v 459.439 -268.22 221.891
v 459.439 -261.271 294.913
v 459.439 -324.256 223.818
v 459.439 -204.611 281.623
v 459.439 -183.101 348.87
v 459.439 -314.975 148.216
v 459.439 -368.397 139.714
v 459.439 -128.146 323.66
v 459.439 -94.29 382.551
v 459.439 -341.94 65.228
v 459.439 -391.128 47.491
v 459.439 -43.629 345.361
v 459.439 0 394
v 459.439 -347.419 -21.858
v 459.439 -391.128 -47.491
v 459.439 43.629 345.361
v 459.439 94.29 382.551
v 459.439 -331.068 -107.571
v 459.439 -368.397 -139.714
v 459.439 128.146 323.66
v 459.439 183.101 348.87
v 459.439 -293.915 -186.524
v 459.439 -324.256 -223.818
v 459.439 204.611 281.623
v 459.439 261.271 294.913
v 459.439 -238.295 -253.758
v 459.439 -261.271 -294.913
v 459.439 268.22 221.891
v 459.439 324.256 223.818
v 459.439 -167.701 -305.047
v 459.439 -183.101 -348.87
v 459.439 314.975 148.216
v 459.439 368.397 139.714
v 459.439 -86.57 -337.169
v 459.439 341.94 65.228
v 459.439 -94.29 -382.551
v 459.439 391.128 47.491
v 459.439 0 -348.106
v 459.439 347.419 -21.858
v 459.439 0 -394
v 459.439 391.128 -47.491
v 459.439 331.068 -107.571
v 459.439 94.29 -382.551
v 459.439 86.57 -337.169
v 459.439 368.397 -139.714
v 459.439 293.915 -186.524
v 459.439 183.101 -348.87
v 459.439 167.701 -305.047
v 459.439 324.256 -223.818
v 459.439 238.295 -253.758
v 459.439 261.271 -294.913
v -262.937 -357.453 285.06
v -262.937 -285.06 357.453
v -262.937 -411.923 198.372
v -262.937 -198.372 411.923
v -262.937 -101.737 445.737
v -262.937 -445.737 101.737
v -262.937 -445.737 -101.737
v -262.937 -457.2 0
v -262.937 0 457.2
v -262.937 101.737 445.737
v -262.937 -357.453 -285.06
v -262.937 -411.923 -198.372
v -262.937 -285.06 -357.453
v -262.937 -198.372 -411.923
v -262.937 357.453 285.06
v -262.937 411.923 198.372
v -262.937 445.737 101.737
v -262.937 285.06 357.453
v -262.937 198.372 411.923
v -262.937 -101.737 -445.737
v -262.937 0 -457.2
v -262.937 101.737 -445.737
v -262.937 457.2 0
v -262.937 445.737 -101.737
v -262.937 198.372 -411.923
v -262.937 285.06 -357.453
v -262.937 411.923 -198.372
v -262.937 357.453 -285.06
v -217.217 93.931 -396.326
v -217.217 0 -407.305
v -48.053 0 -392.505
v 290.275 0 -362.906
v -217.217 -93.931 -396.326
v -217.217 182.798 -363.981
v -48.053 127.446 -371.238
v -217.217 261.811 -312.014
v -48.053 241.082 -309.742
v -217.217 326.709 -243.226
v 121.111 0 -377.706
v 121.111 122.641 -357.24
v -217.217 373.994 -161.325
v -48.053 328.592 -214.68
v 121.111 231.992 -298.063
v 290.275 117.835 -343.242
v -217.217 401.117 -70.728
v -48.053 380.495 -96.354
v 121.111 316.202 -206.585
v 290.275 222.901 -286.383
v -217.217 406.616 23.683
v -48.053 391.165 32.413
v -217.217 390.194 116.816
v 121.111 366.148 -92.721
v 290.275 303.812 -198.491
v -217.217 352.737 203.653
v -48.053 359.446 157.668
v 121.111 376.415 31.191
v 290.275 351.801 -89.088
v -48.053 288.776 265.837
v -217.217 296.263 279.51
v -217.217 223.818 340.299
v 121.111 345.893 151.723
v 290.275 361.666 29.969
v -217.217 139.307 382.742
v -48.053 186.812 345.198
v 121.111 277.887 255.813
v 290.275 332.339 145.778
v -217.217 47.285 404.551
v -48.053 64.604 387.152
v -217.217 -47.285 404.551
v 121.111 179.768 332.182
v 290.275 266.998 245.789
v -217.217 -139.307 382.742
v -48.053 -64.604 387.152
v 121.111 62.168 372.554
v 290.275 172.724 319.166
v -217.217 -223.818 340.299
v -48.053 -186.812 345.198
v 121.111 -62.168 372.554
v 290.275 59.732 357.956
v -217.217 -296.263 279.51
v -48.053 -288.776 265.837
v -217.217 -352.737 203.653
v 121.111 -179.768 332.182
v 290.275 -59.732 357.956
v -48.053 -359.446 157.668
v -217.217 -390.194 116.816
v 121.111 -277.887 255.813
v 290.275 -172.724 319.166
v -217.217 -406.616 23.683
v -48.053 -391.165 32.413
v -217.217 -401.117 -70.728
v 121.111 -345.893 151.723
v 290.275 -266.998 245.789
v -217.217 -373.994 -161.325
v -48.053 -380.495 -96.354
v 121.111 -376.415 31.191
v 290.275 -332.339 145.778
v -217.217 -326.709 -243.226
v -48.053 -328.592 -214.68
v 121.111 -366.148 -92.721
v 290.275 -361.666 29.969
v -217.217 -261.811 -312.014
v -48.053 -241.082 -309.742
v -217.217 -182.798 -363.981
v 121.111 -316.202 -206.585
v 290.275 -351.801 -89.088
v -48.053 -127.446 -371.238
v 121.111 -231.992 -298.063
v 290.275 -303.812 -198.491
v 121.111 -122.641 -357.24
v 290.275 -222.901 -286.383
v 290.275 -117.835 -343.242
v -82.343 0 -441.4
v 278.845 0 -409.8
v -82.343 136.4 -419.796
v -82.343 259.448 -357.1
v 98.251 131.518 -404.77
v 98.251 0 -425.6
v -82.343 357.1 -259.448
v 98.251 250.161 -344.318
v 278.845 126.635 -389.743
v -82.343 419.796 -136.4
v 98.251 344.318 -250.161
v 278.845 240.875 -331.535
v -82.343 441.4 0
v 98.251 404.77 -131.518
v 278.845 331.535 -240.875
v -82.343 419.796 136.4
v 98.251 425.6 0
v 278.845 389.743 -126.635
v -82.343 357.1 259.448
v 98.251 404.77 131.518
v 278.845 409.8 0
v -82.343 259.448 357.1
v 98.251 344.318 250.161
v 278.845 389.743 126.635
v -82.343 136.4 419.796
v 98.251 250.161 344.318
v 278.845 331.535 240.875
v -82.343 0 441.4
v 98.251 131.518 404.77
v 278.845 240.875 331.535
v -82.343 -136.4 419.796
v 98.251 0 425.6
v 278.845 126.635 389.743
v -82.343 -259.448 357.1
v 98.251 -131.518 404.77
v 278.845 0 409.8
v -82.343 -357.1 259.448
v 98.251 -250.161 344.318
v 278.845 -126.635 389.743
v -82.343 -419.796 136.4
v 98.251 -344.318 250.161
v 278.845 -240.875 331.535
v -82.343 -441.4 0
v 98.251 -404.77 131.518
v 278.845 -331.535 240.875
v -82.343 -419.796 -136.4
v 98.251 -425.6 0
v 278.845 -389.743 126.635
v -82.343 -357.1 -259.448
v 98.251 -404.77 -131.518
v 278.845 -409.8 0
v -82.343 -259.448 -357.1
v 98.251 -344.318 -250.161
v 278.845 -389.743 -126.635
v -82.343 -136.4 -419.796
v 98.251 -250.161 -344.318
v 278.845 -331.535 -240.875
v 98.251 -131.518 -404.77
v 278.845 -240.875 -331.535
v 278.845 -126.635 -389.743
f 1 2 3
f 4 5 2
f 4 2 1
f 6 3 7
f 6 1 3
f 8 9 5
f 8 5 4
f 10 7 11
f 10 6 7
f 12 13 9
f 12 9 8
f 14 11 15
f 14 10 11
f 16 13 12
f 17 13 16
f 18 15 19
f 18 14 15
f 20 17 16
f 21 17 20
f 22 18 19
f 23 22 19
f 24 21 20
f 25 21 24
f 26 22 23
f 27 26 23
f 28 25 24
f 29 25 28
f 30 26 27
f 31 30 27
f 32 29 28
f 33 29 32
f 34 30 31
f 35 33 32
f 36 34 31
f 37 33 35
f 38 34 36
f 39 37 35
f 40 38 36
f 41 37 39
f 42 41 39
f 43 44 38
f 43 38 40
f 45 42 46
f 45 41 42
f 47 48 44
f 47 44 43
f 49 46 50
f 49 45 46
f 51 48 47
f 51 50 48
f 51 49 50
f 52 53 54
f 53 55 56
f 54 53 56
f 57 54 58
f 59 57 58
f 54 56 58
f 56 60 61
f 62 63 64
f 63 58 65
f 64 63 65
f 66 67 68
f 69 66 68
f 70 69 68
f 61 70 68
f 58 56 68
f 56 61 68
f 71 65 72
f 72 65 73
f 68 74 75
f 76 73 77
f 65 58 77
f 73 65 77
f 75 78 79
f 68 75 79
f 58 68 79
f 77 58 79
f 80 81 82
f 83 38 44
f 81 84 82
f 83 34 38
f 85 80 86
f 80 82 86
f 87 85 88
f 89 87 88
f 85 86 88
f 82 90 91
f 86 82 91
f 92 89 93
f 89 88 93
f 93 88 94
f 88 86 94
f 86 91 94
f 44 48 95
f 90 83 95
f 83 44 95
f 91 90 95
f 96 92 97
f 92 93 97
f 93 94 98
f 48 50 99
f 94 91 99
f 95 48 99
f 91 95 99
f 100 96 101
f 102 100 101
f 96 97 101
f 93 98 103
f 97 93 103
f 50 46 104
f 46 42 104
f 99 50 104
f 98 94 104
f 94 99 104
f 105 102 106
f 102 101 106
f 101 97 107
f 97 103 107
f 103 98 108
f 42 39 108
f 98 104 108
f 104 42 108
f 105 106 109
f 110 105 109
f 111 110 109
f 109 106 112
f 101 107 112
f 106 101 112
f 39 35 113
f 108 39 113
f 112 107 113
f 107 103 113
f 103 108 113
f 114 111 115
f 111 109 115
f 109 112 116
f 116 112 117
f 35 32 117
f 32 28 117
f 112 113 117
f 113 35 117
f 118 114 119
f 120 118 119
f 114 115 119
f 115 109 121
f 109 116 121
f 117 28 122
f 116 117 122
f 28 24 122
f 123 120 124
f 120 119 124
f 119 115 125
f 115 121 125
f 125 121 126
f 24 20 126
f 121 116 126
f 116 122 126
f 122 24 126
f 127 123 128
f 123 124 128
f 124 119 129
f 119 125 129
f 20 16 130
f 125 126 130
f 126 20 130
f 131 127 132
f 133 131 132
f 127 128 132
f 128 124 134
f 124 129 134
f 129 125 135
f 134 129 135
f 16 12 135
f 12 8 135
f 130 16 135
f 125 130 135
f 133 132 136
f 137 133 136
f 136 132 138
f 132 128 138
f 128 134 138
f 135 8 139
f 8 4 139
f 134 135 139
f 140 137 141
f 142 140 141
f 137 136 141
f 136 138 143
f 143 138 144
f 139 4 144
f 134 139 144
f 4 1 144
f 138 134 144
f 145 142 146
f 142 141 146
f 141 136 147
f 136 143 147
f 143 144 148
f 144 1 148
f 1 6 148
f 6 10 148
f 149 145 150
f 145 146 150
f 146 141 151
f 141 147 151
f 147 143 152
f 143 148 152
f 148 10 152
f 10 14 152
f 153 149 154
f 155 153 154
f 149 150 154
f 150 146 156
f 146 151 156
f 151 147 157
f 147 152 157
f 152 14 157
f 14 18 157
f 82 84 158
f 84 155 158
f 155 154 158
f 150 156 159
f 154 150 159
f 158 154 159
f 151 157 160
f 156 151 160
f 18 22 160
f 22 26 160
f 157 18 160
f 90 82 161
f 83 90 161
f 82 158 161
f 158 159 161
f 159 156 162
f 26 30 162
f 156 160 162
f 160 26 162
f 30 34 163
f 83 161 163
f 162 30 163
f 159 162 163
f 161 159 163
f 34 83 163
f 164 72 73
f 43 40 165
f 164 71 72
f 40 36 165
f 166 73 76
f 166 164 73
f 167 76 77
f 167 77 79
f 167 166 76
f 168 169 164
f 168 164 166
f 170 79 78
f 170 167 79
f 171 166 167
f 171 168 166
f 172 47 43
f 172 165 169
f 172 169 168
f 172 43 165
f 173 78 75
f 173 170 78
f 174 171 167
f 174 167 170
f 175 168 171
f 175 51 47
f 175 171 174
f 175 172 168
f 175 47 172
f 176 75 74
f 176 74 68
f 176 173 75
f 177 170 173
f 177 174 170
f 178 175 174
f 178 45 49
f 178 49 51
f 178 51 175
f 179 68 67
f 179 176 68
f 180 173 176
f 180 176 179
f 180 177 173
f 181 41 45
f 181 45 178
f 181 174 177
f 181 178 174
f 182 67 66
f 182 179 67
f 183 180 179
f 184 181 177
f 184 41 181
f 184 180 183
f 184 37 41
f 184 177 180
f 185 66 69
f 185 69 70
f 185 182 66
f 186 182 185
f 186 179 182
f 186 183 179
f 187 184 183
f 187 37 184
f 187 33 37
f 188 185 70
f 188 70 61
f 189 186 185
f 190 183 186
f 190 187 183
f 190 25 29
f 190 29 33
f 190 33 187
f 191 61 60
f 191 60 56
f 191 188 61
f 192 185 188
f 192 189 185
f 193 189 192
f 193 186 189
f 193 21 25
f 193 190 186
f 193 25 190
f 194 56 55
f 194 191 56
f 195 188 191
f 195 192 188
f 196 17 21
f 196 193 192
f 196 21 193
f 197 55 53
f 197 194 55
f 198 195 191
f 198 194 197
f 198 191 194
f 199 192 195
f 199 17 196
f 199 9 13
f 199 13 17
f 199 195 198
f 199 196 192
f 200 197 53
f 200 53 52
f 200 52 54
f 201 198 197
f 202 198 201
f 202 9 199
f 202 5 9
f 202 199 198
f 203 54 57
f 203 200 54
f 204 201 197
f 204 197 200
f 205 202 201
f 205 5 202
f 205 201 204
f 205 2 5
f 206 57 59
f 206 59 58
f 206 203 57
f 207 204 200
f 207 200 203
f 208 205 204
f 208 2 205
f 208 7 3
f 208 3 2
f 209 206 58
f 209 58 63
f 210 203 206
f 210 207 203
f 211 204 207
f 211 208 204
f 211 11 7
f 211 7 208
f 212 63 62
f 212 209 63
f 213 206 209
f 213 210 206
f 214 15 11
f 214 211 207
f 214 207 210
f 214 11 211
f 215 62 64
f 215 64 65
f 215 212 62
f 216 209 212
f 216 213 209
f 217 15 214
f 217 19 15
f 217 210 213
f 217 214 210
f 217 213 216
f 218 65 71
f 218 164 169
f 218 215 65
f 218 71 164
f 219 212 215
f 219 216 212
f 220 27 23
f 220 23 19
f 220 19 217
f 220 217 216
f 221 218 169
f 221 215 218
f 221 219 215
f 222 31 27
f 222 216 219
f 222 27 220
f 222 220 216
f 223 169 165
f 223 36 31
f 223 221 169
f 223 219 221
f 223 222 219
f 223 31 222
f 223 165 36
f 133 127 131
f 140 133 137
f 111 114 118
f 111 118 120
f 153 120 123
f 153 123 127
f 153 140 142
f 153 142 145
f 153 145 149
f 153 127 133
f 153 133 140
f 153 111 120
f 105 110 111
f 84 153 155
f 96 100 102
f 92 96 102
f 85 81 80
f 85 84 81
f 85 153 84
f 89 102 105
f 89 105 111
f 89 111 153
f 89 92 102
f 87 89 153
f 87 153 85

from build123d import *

# Parameters (mm, degrees)
SKETCH1_R           = 25.4
BOSS_EXTRUDE1_DEPTH = 40.132
BOSS_EXTRUDE1_TAPER = 5
SHELL1_T            = -2.54
SCALE1_SCALE        = 18


with BuildPart() as part:
    # Sketch1 → Boss-Extrude1 (new body)
    with BuildSketch(Plane(origin=(0, 0, 0), x_dir=(0, 0, -1), z_dir=(1, 0, 0))):
        Circle(SKETCH1_R)
    extrude(amount=BOSS_EXTRUDE1_DEPTH, taper=BOSS_EXTRUDE1_TAPER)

    # Shell1
    shell1_openings = [part.faces().sort_by_distance(p)[0] for p in [
        (40.132, 0, 0),
    ]]
    offset(amount=SHELL1_T, openings=shell1_openings, kind=Kind.INTERSECTION)


with BuildPart() as part_1:
    # Scale1: scaled about (15.466911265, 0, 0)
    add(part.part.scale(SCALE1_SCALE).moved(Location((-262.937491505, 0, 0))))


solid = part_1.part
